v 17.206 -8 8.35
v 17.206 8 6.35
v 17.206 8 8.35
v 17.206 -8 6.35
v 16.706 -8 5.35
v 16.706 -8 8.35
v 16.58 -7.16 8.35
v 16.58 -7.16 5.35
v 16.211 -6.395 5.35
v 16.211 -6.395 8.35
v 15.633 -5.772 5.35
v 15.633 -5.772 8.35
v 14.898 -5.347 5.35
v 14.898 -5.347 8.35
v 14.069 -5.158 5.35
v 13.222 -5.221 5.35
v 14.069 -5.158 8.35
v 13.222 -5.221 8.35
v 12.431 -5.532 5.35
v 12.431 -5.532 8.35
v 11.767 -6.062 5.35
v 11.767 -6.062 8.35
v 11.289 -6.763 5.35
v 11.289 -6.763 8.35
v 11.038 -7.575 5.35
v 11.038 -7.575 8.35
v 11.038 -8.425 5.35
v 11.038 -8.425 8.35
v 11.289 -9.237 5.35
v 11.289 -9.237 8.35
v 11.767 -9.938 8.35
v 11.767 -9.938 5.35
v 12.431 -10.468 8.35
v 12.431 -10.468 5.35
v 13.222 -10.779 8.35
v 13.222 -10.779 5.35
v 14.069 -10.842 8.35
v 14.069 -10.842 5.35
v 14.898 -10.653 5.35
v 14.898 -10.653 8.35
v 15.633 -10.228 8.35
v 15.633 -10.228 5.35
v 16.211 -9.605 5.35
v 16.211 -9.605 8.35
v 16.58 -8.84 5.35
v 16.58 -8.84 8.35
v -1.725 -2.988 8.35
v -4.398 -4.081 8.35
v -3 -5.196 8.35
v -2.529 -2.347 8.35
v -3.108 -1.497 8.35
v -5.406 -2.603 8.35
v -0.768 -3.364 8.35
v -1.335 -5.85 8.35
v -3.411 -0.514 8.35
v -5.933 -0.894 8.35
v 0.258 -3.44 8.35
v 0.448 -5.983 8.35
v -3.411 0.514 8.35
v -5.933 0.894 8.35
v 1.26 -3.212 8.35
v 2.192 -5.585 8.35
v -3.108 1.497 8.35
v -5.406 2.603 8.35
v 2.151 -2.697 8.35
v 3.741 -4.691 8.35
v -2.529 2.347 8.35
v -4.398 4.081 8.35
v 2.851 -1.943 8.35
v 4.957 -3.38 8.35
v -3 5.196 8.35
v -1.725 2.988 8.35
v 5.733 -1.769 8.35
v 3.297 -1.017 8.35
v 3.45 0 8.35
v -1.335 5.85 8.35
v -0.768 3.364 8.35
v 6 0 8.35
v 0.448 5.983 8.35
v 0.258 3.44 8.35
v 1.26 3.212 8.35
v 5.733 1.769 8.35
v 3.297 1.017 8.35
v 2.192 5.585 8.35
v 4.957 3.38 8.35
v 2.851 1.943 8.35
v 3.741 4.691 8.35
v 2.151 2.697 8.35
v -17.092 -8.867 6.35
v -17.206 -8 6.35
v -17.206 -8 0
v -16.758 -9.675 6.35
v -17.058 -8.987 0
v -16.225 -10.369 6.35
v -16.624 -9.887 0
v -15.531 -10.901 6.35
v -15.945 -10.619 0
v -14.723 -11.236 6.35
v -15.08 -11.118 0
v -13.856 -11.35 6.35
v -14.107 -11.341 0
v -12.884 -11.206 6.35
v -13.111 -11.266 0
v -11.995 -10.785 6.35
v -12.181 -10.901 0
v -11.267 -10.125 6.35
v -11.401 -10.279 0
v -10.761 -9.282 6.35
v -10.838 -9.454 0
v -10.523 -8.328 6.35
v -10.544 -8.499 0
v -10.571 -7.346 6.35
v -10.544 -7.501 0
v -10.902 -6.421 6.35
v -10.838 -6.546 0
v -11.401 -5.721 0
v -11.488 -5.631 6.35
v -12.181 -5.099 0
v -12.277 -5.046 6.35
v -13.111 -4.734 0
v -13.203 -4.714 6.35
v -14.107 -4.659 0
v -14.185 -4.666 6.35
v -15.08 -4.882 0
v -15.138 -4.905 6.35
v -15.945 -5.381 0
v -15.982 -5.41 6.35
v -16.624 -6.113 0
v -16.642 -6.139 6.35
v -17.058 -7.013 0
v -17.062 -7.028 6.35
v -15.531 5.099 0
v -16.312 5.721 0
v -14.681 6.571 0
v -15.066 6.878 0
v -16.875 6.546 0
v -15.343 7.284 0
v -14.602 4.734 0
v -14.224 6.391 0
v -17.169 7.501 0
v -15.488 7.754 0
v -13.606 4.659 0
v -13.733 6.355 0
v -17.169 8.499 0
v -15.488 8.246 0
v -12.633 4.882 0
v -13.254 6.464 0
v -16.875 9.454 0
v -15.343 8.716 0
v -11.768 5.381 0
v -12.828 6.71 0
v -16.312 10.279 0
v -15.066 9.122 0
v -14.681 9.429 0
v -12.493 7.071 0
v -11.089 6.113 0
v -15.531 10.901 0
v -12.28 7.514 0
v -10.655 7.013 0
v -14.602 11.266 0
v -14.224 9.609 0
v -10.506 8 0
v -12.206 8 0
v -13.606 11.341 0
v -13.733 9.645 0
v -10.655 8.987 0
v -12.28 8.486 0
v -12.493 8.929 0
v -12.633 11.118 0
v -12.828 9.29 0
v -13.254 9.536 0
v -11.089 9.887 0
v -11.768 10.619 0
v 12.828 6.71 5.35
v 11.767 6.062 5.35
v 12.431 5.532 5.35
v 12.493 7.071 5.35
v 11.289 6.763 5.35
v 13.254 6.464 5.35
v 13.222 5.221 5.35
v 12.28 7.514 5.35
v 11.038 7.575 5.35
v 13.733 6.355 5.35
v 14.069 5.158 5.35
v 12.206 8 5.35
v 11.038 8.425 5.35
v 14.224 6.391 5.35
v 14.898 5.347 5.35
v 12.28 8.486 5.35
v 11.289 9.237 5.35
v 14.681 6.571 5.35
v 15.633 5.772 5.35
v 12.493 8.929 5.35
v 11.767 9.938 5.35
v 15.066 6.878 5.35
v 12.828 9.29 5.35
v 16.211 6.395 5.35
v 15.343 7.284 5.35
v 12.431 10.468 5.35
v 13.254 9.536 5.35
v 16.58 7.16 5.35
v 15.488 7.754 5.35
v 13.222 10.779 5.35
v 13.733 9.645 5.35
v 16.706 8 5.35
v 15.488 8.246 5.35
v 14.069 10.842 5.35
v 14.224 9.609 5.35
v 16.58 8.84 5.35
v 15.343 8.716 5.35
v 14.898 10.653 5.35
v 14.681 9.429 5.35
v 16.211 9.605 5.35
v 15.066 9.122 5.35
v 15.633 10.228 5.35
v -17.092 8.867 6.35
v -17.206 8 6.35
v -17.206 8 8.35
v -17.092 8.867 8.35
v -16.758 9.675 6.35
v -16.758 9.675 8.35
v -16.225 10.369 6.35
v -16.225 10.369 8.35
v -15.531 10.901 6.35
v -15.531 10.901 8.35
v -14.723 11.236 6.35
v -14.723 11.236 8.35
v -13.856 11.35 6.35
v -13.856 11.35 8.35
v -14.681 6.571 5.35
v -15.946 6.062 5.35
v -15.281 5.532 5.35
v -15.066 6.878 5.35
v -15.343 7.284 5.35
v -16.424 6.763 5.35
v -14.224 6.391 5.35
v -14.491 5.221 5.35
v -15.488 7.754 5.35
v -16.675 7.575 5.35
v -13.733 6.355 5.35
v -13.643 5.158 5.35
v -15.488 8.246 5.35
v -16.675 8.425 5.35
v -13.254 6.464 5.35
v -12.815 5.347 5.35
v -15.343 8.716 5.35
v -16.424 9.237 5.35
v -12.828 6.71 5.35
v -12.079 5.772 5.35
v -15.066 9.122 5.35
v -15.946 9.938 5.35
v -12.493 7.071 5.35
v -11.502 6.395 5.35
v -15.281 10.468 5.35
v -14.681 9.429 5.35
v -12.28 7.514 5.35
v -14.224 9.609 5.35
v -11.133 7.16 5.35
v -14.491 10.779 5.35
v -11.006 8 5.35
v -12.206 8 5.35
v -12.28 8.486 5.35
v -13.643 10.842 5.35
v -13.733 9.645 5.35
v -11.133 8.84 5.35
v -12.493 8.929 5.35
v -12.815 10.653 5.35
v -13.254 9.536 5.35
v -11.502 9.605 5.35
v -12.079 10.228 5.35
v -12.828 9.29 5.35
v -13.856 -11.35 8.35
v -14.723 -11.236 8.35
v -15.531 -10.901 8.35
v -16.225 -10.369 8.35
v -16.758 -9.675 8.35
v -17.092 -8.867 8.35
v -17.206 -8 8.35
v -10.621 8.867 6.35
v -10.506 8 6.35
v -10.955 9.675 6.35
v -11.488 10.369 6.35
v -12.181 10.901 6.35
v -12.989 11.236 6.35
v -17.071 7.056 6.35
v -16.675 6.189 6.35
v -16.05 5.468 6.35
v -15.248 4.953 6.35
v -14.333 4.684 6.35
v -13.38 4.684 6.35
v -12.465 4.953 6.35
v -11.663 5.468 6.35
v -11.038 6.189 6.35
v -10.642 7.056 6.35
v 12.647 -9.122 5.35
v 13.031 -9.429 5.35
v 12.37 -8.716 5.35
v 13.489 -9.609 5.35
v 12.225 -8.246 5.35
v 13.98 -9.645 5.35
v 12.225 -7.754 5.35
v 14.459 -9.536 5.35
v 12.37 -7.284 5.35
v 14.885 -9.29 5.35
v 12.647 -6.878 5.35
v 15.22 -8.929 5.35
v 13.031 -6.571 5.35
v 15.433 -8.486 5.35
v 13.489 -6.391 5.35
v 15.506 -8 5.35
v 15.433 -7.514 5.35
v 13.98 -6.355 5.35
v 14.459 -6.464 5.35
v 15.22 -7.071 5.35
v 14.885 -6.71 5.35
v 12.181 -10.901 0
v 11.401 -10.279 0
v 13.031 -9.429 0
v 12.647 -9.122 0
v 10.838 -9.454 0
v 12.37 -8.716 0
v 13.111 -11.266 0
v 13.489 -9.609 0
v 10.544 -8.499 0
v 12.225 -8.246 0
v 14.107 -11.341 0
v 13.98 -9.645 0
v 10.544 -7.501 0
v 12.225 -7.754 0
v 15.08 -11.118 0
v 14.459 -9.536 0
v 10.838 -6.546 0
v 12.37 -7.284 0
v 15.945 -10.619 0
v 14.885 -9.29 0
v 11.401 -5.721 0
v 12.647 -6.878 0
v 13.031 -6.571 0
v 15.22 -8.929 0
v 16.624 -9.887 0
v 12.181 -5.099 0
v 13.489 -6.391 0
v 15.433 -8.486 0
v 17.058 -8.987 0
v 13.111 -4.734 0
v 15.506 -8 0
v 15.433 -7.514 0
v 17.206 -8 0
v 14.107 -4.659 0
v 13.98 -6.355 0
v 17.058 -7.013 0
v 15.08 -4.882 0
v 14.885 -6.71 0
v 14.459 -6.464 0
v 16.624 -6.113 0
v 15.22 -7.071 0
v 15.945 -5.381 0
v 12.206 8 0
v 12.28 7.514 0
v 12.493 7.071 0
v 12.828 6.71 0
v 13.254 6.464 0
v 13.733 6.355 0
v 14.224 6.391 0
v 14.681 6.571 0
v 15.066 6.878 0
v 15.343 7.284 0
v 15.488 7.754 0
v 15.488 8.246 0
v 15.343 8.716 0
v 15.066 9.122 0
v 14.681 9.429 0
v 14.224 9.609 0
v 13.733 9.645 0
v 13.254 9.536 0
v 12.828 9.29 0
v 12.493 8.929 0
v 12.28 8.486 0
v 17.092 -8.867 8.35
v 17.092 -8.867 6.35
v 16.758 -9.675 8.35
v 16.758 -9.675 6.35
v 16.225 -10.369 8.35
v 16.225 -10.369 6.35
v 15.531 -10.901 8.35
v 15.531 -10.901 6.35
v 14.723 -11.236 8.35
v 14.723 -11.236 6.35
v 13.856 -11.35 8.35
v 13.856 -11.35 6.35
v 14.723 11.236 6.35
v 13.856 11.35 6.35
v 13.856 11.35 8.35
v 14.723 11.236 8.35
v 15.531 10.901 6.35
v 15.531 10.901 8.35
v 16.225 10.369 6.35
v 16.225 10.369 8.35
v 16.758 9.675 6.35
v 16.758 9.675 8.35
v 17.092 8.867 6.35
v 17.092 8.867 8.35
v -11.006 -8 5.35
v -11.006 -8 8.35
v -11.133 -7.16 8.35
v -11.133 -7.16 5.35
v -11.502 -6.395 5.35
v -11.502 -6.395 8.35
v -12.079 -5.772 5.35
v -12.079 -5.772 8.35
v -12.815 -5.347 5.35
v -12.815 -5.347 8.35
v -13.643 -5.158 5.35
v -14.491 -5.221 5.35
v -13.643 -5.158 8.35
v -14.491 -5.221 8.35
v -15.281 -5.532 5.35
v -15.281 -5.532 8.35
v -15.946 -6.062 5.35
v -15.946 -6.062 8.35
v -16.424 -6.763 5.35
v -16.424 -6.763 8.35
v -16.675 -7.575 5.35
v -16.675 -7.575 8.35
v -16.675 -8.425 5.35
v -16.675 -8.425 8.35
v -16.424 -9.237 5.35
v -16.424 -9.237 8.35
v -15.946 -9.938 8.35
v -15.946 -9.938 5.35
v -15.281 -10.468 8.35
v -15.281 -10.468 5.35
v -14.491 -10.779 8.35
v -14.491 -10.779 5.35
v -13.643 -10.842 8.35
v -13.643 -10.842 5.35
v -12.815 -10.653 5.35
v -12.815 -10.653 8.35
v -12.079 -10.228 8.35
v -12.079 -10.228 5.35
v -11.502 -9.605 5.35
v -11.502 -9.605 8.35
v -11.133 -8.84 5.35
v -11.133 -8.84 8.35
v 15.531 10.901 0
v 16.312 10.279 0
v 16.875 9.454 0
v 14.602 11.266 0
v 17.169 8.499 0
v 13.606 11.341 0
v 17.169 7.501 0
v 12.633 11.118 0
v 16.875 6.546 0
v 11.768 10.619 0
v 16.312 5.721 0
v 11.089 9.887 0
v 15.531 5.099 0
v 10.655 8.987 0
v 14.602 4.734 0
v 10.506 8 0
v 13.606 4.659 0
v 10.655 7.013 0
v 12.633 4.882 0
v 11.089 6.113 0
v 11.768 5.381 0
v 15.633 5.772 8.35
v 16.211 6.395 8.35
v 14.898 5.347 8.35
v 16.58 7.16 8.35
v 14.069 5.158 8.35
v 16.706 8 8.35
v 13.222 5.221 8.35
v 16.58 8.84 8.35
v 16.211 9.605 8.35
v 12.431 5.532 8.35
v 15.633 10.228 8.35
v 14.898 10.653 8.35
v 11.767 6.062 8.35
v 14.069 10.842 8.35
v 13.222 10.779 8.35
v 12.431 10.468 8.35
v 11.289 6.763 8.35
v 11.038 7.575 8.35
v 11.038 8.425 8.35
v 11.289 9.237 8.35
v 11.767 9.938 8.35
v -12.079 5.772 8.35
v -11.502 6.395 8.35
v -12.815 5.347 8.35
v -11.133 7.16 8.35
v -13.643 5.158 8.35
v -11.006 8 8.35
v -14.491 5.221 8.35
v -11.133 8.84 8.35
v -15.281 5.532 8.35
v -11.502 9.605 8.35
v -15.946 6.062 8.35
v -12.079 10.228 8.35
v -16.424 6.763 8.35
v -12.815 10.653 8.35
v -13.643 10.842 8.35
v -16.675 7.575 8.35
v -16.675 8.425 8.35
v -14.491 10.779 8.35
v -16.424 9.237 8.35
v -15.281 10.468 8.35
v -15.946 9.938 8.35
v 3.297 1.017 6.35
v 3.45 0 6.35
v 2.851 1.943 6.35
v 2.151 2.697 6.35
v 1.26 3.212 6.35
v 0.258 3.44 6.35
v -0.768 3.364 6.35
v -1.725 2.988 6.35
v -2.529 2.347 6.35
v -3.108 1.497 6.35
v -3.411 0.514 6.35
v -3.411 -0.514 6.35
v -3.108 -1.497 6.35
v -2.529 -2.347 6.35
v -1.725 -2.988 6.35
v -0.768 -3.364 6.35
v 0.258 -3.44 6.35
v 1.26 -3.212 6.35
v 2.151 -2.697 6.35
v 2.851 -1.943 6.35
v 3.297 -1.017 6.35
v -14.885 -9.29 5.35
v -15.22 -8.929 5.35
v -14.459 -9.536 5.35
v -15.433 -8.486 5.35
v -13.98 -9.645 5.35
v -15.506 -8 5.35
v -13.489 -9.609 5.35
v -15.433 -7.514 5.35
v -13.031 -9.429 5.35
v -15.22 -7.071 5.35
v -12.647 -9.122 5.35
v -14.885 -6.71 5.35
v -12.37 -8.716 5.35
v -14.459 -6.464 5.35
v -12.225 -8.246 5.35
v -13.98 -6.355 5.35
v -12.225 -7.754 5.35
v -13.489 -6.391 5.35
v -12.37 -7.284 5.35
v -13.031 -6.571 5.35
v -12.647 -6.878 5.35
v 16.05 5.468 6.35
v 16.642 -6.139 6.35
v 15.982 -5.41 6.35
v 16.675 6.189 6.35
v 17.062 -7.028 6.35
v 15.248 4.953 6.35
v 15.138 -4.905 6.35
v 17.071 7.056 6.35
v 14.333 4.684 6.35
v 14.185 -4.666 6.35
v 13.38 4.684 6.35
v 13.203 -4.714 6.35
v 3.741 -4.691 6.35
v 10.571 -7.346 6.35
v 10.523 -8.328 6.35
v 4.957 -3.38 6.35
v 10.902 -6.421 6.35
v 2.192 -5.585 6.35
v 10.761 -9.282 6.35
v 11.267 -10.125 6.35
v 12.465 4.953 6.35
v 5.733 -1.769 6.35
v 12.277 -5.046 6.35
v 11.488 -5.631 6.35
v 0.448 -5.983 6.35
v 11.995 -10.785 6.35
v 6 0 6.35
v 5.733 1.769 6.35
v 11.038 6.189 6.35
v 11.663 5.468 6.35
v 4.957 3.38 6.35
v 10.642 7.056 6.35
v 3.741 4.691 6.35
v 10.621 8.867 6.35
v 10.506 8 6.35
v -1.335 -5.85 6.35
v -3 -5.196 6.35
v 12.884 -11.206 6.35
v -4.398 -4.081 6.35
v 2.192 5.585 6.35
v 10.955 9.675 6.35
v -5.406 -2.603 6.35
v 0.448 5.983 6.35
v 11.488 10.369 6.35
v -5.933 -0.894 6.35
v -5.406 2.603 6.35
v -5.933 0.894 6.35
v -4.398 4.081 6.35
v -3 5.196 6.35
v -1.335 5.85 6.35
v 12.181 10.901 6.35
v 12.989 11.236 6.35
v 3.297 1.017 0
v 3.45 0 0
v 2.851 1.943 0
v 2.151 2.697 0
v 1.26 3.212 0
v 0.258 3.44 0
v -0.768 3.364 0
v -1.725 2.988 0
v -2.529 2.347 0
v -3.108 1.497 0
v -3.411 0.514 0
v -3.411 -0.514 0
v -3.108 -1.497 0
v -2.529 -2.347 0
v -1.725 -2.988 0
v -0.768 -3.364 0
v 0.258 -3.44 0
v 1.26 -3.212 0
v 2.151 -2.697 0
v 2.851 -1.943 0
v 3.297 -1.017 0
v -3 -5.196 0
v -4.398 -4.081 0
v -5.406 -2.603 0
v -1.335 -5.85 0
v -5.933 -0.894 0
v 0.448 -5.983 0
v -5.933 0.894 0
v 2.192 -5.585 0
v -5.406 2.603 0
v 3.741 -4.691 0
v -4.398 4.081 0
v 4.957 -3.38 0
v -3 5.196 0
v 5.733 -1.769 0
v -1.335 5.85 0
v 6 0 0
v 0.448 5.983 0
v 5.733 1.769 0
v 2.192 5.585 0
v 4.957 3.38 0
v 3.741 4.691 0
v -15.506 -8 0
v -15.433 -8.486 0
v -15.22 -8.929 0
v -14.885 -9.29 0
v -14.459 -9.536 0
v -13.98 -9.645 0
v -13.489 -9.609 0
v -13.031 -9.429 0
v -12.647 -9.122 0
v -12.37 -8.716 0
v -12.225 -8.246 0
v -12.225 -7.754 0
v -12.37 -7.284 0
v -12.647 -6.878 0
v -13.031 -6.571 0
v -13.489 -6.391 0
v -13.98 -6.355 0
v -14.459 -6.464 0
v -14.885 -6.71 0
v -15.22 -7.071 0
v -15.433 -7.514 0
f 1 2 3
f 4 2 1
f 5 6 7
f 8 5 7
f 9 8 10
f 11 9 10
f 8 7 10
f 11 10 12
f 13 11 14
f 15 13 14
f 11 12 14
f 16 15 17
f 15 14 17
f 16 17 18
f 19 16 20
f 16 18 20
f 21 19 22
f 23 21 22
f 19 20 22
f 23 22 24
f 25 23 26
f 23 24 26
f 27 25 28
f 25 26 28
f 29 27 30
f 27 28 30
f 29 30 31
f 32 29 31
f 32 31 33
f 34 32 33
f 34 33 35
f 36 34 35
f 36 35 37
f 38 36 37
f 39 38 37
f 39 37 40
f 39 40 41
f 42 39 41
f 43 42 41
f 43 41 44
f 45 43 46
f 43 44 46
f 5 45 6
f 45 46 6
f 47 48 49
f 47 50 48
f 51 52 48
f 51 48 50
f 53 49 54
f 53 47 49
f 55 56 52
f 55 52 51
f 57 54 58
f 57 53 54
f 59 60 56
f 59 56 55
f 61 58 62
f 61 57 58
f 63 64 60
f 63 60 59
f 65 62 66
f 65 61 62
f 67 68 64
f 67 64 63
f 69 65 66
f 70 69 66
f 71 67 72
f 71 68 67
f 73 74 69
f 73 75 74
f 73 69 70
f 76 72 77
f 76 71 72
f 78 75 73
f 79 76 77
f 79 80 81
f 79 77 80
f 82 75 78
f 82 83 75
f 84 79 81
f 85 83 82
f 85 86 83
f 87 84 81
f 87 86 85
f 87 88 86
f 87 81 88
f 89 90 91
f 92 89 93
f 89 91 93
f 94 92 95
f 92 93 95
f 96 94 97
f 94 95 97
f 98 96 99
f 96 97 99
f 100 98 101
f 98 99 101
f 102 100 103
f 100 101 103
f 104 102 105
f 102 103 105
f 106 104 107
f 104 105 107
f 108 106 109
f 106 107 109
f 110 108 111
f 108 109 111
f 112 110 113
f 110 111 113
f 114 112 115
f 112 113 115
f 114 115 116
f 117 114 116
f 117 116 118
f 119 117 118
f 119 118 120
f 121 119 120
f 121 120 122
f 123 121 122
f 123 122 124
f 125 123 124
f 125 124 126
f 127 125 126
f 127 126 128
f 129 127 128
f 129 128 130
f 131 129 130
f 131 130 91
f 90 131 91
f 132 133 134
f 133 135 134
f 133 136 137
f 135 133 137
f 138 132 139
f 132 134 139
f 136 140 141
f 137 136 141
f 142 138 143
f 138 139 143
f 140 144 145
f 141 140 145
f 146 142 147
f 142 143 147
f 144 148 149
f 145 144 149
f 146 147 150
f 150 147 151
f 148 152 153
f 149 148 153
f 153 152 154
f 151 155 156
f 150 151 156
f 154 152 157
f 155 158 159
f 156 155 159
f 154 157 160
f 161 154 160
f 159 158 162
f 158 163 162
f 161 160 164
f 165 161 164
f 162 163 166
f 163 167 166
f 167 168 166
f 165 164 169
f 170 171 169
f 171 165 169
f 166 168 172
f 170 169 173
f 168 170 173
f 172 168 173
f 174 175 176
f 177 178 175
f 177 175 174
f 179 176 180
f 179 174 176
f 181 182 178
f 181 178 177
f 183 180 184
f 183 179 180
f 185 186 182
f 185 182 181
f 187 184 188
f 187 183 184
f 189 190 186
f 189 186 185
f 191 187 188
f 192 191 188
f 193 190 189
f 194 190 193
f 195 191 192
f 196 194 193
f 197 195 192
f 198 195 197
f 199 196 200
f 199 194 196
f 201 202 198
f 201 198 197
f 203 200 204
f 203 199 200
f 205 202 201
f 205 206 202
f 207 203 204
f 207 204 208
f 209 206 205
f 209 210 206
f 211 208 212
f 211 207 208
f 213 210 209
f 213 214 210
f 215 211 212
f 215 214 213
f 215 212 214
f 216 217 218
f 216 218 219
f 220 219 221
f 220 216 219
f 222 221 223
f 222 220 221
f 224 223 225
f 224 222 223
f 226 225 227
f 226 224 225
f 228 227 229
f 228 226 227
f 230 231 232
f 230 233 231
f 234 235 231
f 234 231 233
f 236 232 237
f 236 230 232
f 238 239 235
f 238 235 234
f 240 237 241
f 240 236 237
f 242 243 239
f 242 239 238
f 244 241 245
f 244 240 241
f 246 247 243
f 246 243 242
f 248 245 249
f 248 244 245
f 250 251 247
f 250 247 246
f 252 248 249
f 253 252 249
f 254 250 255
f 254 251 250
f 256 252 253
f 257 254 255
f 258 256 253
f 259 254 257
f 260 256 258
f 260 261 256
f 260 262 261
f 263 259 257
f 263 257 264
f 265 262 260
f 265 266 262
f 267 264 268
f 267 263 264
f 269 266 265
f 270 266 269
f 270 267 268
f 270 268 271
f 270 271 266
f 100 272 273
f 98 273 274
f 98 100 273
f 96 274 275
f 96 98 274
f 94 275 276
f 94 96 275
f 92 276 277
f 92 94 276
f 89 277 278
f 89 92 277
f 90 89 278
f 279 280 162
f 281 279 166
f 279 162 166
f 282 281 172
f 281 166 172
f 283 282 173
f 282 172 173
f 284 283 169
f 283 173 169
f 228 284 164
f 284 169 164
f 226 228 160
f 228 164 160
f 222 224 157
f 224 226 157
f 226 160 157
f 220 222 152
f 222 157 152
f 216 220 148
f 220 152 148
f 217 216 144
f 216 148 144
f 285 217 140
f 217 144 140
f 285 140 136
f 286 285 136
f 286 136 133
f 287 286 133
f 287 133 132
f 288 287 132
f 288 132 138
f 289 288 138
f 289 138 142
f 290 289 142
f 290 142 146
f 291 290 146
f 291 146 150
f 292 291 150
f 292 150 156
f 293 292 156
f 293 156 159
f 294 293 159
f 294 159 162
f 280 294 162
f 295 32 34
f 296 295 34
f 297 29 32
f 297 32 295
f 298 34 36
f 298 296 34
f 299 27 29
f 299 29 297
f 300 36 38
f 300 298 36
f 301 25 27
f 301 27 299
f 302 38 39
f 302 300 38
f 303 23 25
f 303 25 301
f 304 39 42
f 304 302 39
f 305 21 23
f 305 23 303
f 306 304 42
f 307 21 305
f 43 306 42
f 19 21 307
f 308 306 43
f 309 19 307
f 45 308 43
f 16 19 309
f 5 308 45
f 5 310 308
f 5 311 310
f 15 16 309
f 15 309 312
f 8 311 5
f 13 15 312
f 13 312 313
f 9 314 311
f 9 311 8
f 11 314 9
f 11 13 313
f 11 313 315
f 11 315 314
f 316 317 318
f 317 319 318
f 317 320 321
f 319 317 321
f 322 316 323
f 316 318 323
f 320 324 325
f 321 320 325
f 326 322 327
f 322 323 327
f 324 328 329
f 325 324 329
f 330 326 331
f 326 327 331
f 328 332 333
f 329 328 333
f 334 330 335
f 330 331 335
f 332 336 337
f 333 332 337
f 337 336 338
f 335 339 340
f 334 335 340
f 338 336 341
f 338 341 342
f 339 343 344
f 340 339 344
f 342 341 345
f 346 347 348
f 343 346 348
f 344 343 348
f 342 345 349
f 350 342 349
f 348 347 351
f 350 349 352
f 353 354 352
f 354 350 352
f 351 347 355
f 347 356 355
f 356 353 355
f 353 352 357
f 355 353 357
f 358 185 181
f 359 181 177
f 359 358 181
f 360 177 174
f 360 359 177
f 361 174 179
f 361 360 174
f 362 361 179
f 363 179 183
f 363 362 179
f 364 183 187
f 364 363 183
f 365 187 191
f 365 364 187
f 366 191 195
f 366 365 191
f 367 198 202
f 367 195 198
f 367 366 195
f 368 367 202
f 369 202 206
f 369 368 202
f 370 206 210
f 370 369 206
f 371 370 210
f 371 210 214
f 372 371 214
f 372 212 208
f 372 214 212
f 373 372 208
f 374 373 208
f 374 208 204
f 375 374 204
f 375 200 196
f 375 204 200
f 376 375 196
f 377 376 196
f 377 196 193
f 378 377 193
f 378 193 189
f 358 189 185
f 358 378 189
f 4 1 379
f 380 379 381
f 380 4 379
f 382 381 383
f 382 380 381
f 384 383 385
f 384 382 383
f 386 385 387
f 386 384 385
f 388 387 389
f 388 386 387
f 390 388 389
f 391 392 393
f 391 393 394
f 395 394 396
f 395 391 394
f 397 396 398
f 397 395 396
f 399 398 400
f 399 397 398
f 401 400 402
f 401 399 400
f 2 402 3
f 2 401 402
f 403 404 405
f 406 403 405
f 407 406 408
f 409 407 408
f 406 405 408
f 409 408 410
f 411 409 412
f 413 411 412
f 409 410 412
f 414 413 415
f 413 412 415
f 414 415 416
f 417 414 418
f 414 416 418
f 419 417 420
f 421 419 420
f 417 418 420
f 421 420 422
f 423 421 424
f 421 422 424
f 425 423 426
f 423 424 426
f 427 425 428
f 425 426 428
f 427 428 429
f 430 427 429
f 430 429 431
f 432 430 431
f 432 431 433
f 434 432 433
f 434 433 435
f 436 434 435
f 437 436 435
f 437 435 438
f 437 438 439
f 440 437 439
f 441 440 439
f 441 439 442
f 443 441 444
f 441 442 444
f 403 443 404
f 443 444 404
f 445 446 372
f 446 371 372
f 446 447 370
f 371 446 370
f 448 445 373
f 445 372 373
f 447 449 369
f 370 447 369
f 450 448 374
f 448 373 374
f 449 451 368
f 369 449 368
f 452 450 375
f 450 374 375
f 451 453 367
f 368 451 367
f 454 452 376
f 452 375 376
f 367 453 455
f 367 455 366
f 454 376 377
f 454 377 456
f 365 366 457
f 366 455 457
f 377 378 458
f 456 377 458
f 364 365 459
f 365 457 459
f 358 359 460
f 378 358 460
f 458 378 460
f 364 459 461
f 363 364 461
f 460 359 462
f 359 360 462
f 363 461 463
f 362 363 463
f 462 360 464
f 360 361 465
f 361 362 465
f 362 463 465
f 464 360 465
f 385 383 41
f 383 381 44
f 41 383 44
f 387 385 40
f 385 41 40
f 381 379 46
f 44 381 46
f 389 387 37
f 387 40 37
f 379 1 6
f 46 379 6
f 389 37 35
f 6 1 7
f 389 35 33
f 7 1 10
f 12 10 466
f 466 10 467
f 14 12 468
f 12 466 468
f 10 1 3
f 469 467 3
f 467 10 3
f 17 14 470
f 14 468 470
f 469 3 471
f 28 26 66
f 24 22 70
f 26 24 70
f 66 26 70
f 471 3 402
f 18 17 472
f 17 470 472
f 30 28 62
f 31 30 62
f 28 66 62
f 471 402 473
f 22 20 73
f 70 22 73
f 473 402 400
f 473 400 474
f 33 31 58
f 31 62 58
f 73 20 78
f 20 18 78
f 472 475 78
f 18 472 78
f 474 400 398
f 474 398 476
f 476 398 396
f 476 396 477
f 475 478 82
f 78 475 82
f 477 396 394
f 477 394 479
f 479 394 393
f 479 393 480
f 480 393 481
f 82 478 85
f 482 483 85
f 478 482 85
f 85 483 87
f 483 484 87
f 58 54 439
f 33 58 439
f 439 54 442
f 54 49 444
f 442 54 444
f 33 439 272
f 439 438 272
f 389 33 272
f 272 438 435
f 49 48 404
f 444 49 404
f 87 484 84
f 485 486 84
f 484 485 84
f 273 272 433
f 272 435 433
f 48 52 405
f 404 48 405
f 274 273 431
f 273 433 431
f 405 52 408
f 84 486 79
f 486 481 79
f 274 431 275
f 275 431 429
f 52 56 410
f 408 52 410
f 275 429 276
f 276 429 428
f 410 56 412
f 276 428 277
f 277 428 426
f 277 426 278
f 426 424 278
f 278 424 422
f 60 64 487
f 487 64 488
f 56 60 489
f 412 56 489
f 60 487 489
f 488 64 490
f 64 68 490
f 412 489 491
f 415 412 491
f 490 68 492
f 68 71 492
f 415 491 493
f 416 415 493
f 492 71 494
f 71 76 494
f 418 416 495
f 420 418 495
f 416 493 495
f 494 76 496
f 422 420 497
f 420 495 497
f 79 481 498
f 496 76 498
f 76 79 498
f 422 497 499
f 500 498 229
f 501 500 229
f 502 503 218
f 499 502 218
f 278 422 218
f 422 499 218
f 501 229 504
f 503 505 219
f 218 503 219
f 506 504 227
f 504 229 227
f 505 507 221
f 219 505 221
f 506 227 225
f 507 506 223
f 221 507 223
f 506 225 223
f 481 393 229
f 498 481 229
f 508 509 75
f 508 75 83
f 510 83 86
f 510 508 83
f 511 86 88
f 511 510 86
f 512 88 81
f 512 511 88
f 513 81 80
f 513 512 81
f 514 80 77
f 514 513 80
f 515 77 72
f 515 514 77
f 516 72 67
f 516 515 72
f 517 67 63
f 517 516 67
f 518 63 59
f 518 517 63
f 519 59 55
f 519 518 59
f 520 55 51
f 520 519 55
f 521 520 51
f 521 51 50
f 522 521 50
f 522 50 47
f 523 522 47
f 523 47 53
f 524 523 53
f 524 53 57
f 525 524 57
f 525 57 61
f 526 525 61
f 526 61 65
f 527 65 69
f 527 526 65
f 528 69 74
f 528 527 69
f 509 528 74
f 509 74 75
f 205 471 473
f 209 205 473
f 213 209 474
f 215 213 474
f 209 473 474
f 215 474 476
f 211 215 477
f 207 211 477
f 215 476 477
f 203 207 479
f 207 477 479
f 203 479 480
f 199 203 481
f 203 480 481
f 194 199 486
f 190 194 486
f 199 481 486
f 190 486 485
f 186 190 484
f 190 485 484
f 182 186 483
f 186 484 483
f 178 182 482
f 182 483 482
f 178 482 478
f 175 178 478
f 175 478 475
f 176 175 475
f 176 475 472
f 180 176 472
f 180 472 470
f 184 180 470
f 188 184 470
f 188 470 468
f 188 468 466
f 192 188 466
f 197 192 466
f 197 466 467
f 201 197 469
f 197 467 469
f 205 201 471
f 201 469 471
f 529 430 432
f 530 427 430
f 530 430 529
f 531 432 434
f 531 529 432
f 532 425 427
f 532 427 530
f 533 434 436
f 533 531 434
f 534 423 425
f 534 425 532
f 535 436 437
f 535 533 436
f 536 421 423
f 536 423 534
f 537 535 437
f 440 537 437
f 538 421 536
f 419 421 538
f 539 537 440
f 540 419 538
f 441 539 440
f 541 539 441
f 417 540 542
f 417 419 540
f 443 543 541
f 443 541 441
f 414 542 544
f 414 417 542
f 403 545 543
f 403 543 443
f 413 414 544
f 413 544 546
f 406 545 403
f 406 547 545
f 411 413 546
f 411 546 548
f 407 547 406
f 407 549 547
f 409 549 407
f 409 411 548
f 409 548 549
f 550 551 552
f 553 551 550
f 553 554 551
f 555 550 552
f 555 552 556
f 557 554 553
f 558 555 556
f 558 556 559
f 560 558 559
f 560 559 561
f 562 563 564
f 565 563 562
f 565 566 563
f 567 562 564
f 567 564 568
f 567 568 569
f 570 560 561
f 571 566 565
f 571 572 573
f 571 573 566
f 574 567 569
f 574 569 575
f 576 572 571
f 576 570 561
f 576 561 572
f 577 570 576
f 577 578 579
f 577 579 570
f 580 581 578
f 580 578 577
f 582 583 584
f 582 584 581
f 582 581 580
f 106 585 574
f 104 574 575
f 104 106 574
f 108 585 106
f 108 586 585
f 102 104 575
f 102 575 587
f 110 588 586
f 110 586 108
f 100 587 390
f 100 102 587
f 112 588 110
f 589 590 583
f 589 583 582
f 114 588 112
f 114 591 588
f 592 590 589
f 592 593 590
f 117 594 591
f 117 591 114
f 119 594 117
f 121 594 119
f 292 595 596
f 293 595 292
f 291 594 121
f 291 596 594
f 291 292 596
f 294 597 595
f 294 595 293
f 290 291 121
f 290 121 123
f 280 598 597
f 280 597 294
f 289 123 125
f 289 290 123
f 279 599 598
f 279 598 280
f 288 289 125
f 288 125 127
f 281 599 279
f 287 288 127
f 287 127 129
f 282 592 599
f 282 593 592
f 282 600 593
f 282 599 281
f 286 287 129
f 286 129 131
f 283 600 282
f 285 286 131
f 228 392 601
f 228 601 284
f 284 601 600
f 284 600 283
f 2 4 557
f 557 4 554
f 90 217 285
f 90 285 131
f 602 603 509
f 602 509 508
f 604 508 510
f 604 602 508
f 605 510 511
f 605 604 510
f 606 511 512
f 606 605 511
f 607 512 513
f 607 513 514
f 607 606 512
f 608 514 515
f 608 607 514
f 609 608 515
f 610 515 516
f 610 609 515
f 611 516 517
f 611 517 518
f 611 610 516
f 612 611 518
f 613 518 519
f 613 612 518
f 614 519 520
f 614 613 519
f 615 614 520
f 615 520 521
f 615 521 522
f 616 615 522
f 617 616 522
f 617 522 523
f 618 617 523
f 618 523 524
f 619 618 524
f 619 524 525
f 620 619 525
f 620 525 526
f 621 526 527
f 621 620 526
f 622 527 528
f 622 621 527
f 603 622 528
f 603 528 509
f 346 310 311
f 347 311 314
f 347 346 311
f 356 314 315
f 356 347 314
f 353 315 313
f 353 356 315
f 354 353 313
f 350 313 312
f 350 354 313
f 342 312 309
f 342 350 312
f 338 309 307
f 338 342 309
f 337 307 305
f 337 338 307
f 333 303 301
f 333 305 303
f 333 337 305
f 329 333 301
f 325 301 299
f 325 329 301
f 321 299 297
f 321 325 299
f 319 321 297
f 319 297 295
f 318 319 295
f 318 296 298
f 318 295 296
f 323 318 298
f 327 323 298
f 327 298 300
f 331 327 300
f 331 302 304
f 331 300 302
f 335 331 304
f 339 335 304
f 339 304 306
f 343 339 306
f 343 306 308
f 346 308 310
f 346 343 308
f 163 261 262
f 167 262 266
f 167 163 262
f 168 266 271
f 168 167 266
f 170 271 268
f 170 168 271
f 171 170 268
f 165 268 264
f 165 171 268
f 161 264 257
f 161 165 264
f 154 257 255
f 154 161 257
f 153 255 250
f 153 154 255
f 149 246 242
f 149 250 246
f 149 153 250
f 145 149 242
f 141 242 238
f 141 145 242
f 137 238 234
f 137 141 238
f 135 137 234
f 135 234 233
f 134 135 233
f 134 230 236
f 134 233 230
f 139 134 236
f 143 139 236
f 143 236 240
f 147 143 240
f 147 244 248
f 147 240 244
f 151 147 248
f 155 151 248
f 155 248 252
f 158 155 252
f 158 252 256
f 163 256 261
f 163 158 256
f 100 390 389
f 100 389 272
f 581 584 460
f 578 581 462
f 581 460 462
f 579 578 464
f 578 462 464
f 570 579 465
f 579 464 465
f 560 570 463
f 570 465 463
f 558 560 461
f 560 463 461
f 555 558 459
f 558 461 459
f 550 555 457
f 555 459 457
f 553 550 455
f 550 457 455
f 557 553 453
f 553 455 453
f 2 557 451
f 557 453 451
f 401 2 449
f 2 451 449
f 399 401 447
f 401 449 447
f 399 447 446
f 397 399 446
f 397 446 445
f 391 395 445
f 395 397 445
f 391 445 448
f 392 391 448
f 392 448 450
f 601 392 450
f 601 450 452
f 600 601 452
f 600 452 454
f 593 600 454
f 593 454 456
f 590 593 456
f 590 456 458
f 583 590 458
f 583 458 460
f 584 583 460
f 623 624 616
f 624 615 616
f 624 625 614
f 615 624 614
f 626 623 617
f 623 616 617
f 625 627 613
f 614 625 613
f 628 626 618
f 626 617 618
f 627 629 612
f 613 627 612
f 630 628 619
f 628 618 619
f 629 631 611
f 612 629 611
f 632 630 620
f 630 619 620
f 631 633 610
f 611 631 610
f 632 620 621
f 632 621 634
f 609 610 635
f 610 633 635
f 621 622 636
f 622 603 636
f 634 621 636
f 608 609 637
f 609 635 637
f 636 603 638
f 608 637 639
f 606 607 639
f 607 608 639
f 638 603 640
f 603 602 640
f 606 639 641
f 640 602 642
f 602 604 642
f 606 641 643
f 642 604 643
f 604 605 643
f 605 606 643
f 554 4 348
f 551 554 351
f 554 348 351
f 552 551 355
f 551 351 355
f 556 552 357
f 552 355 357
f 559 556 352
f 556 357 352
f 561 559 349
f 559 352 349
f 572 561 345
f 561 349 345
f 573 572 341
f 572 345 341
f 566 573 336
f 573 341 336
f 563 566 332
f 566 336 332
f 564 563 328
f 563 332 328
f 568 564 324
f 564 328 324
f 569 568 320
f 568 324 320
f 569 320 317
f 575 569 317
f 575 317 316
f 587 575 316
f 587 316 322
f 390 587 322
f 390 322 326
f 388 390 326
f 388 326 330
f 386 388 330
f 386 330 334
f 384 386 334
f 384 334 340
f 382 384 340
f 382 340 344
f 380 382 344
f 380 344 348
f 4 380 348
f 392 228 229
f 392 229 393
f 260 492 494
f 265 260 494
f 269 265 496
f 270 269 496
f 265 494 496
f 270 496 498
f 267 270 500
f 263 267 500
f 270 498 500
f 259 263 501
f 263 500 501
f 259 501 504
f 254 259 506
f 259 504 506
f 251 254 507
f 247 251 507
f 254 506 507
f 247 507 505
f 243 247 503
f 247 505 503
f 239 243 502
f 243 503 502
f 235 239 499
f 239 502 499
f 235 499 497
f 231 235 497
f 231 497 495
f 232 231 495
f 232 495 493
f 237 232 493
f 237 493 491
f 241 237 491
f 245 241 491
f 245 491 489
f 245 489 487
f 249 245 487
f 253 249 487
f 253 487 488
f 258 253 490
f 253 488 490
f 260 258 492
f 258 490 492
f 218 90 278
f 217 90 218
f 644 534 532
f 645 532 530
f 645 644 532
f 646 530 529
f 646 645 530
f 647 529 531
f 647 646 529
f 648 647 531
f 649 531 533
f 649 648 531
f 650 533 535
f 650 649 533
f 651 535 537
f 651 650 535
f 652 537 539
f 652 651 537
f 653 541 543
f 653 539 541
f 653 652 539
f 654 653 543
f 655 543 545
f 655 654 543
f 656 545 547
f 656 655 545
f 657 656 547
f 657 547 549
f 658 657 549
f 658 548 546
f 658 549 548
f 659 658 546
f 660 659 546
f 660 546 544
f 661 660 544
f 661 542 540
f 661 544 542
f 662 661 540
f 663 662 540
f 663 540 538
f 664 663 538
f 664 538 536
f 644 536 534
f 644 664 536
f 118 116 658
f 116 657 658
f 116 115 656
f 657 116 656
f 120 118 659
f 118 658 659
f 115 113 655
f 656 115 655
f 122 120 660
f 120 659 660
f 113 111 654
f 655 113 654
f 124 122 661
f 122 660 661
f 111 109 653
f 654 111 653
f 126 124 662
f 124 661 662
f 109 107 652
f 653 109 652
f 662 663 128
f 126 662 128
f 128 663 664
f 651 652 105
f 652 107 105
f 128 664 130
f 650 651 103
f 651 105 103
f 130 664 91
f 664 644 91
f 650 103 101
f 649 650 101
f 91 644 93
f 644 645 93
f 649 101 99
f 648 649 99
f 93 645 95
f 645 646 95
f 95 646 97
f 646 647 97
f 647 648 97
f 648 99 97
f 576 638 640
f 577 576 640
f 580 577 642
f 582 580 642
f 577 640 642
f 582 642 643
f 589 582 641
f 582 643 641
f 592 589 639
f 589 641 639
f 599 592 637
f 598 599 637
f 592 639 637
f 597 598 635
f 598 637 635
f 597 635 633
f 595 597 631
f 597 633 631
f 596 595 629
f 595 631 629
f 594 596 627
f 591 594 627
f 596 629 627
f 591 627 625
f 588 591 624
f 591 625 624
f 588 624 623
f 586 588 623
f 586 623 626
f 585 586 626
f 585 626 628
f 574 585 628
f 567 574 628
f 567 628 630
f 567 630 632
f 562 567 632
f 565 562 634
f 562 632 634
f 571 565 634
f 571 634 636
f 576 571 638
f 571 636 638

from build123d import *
from build123d.topology import SkipClean

# Parameters (mm, degrees)
SKETCH1_R             = 3.35
SKETCH1_R_2           = 1.65
BOSS_EXTRUDE1_DEPTH   = 6.35
BOSS_EXTRUDE1_2_DEPTH = 6.35
BOSS_EXTRUDE1_3_DEPTH = 6.35
BOSS_EXTRUDE1_4_DEPTH = 6.35
SKETCH1_R_3           = 6
SKETCH1_R_4           = 3.45
BOSS_EXTRUDE1_5_DEPTH = 6.35
SKETCH2_R             = 1.65
SKETCH2_R_2           = 6
SKETCH2_R_3           = 3.45
BOSS_EXTRUDE2_DEPTH   = 2
SKETCH3_R             = 2.85
CUT_EXTRUDE1_DEPTH    = 3


with BuildPart() as part:
    # Sketch1 → Boss-Extrude1 (new body)
    with BuildSketch(Plane.XY):
        with Locations((-13.856406461, 8)):
            Circle(SKETCH1_R)
        with Locations((-13.856406461, 8)):
            Circle(SKETCH1_R_2, mode=Mode.SUBTRACT)
    extrude(amount=BOSS_EXTRUDE1_DEPTH)



with BuildPart() as body_2:
    # Sketch1 → Boss-Extrude1 2 (new body)
    with BuildSketch(Plane.XY):
        with Locations(Location((-13.856406461, -8, 0), (0, 0, 180))):
            Circle(SKETCH1_R)
        with Locations(Location((-13.856406461, -8, 0), (0, 0, 180))):
            Circle(SKETCH1_R_2, mode=Mode.SUBTRACT)
    extrude(amount=BOSS_EXTRUDE1_2_DEPTH)


with BuildPart() as body_3:
    # Sketch1 → Boss-Extrude1 3 (new body)
    with BuildSketch(Plane.XY):
        with Locations((13.856406461, -8)):
            Circle(SKETCH1_R)
        with Locations((13.856406461, -8)):
            Circle(SKETCH1_R_2, mode=Mode.SUBTRACT)
    extrude(amount=BOSS_EXTRUDE1_3_DEPTH)


with BuildPart() as body_4:
    # Sketch1 → Boss-Extrude1 4 (new body)
    with BuildSketch(Plane.XY):
        with Locations(Location((13.856406461, 8, 0), (0, 0, 180))):
            Circle(SKETCH1_R)
        with Locations(Location((13.856406461, 8, 0), (0, 0, 180))):
            Circle(SKETCH1_R_2, mode=Mode.SUBTRACT)
    extrude(amount=BOSS_EXTRUDE1_4_DEPTH)


with BuildPart() as body_5:
    # Sketch1 → Boss-Extrude1 5 (new body)
    with BuildSketch(Plane.XY):
        Circle(SKETCH1_R_3)
        Circle(SKETCH1_R_4, mode=Mode.SUBTRACT)
    extrude(amount=BOSS_EXTRUDE1_5_DEPTH)


with BuildPart() as part_1:
    with SkipClean():  # the faces are left unmerged after this step: merging them gives an invalid solid
        add(part.part)

        add(body_2.part)  # Boss-Extrude2 merges body 2

        add(body_3.part)  # Boss-Extrude2 merges body 3

        add(body_4.part)  # Boss-Extrude2 merges body 4

        add(body_5.part)  # Boss-Extrude2 merges body 5
        # Sketch2 → Boss-Extrude2 (add)
        # profile 1 of 2: a face of its own
        with BuildSketch(Plane.XY.offset(6.35)):
            with BuildLine():
                Line((-13.856406461, 11.35), (13.856406461, 11.35))
                ThreePointArc((13.856406461, 11.35), (16.225214178, 10.368807717), (17.206406461, 8))
                Line((17.206406461, 8), (17.206406461, -8))
                ThreePointArc((17.206406461, -8), (16.225214178, -10.368807717), (13.856406461, -11.35))
                Line((13.856406461, -11.35), (-13.856406461, -11.35))
                ThreePointArc((-13.856406461, -11.35), (-16.225214178, -10.368807717), (-17.206406461, -8))
                Line((-17.206406461, -8), (-17.206406461, 8))
                ThreePointArc((-17.206406461, 8), (-16.225214178, 10.368807717), (-13.856406461, 11.35))
            make_face()
            with Locations((-13.856406461, 8)):
                Circle(SKETCH2_R, mode=Mode.SUBTRACT)
            with Locations(Location((-13.856406461, -8, 0), (0, 0, 180))):
                Circle(SKETCH2_R, mode=Mode.SUBTRACT)
            with Locations(Location((13.856406461, 8, 0), (0, 0, 180))):
                Circle(SKETCH2_R, mode=Mode.SUBTRACT)
            with Locations((13.856406461, -8)):
                Circle(SKETCH2_R, mode=Mode.SUBTRACT)
            Circle(SKETCH2_R_2, mode=Mode.SUBTRACT)
        # profile 2 of 2: a face of its own
        with BuildSketch(Plane.XY.offset(6.35)):
            Circle(SKETCH2_R_2)
            Circle(SKETCH2_R_3, mode=Mode.SUBTRACT)
        extrude(amount=BOSS_EXTRUDE2_DEPTH)

    # Sketch3 → Cut-Extrude1 (cut)
    with SkipClean():  # the faces are left unmerged after this step: merging them gives an invalid solid
        with BuildSketch(Plane.XY.offset(8.35)):
            with Locations((-13.856406461, 8)):
                Circle(SKETCH3_R)
            with Locations((-13.856406461, -8)):
                Circle(SKETCH3_R)
            with Locations((13.856406461, -8)):
                Circle(SKETCH3_R)
            with Locations((13.856406461, 8)):
                Circle(SKETCH3_R)
        extrude(amount=-CUT_EXTRUDE1_DEPTH, mode=Mode.SUBTRACT)


solid = part_1.part
